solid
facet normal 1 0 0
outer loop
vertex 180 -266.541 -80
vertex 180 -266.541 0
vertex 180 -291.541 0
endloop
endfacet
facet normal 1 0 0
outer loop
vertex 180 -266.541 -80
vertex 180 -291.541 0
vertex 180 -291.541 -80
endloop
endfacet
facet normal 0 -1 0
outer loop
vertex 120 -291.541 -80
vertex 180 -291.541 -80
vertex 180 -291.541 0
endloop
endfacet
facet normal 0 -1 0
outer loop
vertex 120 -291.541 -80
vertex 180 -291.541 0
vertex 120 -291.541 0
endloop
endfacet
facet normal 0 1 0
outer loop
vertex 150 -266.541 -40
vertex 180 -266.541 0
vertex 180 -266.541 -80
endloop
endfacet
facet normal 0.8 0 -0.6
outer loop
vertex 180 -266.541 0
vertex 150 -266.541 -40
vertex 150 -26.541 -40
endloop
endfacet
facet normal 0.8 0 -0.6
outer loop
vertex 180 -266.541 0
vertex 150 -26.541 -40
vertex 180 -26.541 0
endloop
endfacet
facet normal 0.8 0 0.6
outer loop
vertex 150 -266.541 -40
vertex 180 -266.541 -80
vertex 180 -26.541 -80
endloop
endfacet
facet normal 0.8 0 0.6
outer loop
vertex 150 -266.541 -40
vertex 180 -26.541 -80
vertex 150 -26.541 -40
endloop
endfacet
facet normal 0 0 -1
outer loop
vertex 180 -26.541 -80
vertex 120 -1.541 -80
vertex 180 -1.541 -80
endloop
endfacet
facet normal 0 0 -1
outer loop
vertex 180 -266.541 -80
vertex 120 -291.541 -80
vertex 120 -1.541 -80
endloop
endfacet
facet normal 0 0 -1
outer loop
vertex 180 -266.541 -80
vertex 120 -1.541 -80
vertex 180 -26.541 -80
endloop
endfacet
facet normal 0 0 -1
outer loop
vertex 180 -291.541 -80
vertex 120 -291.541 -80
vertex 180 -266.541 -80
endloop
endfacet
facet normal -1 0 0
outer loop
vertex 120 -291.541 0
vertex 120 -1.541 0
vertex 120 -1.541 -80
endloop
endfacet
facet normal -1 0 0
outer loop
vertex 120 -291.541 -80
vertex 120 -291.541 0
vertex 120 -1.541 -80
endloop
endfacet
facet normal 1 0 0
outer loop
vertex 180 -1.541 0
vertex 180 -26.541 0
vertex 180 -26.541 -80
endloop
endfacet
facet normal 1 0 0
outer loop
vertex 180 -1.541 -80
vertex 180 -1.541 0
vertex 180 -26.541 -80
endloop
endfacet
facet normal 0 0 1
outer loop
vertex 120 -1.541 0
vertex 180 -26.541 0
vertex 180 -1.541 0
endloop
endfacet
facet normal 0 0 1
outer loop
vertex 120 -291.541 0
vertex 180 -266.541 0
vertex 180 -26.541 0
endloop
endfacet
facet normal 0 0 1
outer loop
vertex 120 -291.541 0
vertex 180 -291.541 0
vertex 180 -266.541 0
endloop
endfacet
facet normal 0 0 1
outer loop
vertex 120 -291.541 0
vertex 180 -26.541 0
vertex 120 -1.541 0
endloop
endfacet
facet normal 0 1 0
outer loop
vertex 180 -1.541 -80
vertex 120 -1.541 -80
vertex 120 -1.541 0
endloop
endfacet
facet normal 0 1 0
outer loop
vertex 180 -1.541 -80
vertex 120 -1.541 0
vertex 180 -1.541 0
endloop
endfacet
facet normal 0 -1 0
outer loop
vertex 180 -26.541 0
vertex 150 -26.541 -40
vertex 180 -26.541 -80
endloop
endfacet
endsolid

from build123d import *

# Parameters (mm, degrees)
SKETCH3_W           = 60
SKETCH3_H           = 80
BOSS_EXTRUDE1_DEPTH = 25
SKETCH4_W           = 60
SKETCH4_H           = 80
BOSS_EXTRUDE2_DEPTH = 25
BOSS_EXTRUDE3_DEPTH = 240
BOSS_EXTRUDE4_DEPTH = 240


with BuildPart() as part:
    # Sketch3 → Boss-Extrude1 (new body)
    with BuildSketch(Plane(origin=(0, -266.5409196, 0), x_dir=(-1, 0, 0), z_dir=(0, -1, 0))):
        with Locations((-150, 40)):
            Rectangle(SKETCH3_W, SKETCH3_H)
    extrude(amount=BOSS_EXTRUDE1_DEPTH)



with BuildPart() as body_2:
    # Sketch4 → Boss-Extrude2 (new body)
    with BuildSketch(Plane(origin=(0, -26.5409196, 0), x_dir=(1, 0, 0), z_dir=(0, 1, 0))):
        with Locations((150, 40)):
            Rectangle(SKETCH4_W, SKETCH4_H)
    extrude(amount=BOSS_EXTRUDE2_DEPTH)


with BuildPart() as part_1:
    add(part.part)

    add(body_2.part)  # Boss-Extrude3 merges body 2
    # Sketch5 → Boss-Extrude3 (add)
    with BuildSketch(Plane(origin=(0, -266.5409196, 0), x_dir=(1, 0, 0), z_dir=(0, 1, 0))):
        Polygon((120, 80), (180, 0), (120, 0), align=None)
    extrude(amount=BOSS_EXTRUDE3_DEPTH)

    # Sketch6 → Boss-Extrude4 (add)
    with BuildSketch(Plane(origin=(0, -266.5409196, 0), x_dir=(1, 0, 0), z_dir=(0, 1, 0))):
        Polygon((120, 80), (180, 80), (120, 0), align=None)
    extrude(amount=BOSS_EXTRUDE4_DEPTH)


solid = part_1.part
